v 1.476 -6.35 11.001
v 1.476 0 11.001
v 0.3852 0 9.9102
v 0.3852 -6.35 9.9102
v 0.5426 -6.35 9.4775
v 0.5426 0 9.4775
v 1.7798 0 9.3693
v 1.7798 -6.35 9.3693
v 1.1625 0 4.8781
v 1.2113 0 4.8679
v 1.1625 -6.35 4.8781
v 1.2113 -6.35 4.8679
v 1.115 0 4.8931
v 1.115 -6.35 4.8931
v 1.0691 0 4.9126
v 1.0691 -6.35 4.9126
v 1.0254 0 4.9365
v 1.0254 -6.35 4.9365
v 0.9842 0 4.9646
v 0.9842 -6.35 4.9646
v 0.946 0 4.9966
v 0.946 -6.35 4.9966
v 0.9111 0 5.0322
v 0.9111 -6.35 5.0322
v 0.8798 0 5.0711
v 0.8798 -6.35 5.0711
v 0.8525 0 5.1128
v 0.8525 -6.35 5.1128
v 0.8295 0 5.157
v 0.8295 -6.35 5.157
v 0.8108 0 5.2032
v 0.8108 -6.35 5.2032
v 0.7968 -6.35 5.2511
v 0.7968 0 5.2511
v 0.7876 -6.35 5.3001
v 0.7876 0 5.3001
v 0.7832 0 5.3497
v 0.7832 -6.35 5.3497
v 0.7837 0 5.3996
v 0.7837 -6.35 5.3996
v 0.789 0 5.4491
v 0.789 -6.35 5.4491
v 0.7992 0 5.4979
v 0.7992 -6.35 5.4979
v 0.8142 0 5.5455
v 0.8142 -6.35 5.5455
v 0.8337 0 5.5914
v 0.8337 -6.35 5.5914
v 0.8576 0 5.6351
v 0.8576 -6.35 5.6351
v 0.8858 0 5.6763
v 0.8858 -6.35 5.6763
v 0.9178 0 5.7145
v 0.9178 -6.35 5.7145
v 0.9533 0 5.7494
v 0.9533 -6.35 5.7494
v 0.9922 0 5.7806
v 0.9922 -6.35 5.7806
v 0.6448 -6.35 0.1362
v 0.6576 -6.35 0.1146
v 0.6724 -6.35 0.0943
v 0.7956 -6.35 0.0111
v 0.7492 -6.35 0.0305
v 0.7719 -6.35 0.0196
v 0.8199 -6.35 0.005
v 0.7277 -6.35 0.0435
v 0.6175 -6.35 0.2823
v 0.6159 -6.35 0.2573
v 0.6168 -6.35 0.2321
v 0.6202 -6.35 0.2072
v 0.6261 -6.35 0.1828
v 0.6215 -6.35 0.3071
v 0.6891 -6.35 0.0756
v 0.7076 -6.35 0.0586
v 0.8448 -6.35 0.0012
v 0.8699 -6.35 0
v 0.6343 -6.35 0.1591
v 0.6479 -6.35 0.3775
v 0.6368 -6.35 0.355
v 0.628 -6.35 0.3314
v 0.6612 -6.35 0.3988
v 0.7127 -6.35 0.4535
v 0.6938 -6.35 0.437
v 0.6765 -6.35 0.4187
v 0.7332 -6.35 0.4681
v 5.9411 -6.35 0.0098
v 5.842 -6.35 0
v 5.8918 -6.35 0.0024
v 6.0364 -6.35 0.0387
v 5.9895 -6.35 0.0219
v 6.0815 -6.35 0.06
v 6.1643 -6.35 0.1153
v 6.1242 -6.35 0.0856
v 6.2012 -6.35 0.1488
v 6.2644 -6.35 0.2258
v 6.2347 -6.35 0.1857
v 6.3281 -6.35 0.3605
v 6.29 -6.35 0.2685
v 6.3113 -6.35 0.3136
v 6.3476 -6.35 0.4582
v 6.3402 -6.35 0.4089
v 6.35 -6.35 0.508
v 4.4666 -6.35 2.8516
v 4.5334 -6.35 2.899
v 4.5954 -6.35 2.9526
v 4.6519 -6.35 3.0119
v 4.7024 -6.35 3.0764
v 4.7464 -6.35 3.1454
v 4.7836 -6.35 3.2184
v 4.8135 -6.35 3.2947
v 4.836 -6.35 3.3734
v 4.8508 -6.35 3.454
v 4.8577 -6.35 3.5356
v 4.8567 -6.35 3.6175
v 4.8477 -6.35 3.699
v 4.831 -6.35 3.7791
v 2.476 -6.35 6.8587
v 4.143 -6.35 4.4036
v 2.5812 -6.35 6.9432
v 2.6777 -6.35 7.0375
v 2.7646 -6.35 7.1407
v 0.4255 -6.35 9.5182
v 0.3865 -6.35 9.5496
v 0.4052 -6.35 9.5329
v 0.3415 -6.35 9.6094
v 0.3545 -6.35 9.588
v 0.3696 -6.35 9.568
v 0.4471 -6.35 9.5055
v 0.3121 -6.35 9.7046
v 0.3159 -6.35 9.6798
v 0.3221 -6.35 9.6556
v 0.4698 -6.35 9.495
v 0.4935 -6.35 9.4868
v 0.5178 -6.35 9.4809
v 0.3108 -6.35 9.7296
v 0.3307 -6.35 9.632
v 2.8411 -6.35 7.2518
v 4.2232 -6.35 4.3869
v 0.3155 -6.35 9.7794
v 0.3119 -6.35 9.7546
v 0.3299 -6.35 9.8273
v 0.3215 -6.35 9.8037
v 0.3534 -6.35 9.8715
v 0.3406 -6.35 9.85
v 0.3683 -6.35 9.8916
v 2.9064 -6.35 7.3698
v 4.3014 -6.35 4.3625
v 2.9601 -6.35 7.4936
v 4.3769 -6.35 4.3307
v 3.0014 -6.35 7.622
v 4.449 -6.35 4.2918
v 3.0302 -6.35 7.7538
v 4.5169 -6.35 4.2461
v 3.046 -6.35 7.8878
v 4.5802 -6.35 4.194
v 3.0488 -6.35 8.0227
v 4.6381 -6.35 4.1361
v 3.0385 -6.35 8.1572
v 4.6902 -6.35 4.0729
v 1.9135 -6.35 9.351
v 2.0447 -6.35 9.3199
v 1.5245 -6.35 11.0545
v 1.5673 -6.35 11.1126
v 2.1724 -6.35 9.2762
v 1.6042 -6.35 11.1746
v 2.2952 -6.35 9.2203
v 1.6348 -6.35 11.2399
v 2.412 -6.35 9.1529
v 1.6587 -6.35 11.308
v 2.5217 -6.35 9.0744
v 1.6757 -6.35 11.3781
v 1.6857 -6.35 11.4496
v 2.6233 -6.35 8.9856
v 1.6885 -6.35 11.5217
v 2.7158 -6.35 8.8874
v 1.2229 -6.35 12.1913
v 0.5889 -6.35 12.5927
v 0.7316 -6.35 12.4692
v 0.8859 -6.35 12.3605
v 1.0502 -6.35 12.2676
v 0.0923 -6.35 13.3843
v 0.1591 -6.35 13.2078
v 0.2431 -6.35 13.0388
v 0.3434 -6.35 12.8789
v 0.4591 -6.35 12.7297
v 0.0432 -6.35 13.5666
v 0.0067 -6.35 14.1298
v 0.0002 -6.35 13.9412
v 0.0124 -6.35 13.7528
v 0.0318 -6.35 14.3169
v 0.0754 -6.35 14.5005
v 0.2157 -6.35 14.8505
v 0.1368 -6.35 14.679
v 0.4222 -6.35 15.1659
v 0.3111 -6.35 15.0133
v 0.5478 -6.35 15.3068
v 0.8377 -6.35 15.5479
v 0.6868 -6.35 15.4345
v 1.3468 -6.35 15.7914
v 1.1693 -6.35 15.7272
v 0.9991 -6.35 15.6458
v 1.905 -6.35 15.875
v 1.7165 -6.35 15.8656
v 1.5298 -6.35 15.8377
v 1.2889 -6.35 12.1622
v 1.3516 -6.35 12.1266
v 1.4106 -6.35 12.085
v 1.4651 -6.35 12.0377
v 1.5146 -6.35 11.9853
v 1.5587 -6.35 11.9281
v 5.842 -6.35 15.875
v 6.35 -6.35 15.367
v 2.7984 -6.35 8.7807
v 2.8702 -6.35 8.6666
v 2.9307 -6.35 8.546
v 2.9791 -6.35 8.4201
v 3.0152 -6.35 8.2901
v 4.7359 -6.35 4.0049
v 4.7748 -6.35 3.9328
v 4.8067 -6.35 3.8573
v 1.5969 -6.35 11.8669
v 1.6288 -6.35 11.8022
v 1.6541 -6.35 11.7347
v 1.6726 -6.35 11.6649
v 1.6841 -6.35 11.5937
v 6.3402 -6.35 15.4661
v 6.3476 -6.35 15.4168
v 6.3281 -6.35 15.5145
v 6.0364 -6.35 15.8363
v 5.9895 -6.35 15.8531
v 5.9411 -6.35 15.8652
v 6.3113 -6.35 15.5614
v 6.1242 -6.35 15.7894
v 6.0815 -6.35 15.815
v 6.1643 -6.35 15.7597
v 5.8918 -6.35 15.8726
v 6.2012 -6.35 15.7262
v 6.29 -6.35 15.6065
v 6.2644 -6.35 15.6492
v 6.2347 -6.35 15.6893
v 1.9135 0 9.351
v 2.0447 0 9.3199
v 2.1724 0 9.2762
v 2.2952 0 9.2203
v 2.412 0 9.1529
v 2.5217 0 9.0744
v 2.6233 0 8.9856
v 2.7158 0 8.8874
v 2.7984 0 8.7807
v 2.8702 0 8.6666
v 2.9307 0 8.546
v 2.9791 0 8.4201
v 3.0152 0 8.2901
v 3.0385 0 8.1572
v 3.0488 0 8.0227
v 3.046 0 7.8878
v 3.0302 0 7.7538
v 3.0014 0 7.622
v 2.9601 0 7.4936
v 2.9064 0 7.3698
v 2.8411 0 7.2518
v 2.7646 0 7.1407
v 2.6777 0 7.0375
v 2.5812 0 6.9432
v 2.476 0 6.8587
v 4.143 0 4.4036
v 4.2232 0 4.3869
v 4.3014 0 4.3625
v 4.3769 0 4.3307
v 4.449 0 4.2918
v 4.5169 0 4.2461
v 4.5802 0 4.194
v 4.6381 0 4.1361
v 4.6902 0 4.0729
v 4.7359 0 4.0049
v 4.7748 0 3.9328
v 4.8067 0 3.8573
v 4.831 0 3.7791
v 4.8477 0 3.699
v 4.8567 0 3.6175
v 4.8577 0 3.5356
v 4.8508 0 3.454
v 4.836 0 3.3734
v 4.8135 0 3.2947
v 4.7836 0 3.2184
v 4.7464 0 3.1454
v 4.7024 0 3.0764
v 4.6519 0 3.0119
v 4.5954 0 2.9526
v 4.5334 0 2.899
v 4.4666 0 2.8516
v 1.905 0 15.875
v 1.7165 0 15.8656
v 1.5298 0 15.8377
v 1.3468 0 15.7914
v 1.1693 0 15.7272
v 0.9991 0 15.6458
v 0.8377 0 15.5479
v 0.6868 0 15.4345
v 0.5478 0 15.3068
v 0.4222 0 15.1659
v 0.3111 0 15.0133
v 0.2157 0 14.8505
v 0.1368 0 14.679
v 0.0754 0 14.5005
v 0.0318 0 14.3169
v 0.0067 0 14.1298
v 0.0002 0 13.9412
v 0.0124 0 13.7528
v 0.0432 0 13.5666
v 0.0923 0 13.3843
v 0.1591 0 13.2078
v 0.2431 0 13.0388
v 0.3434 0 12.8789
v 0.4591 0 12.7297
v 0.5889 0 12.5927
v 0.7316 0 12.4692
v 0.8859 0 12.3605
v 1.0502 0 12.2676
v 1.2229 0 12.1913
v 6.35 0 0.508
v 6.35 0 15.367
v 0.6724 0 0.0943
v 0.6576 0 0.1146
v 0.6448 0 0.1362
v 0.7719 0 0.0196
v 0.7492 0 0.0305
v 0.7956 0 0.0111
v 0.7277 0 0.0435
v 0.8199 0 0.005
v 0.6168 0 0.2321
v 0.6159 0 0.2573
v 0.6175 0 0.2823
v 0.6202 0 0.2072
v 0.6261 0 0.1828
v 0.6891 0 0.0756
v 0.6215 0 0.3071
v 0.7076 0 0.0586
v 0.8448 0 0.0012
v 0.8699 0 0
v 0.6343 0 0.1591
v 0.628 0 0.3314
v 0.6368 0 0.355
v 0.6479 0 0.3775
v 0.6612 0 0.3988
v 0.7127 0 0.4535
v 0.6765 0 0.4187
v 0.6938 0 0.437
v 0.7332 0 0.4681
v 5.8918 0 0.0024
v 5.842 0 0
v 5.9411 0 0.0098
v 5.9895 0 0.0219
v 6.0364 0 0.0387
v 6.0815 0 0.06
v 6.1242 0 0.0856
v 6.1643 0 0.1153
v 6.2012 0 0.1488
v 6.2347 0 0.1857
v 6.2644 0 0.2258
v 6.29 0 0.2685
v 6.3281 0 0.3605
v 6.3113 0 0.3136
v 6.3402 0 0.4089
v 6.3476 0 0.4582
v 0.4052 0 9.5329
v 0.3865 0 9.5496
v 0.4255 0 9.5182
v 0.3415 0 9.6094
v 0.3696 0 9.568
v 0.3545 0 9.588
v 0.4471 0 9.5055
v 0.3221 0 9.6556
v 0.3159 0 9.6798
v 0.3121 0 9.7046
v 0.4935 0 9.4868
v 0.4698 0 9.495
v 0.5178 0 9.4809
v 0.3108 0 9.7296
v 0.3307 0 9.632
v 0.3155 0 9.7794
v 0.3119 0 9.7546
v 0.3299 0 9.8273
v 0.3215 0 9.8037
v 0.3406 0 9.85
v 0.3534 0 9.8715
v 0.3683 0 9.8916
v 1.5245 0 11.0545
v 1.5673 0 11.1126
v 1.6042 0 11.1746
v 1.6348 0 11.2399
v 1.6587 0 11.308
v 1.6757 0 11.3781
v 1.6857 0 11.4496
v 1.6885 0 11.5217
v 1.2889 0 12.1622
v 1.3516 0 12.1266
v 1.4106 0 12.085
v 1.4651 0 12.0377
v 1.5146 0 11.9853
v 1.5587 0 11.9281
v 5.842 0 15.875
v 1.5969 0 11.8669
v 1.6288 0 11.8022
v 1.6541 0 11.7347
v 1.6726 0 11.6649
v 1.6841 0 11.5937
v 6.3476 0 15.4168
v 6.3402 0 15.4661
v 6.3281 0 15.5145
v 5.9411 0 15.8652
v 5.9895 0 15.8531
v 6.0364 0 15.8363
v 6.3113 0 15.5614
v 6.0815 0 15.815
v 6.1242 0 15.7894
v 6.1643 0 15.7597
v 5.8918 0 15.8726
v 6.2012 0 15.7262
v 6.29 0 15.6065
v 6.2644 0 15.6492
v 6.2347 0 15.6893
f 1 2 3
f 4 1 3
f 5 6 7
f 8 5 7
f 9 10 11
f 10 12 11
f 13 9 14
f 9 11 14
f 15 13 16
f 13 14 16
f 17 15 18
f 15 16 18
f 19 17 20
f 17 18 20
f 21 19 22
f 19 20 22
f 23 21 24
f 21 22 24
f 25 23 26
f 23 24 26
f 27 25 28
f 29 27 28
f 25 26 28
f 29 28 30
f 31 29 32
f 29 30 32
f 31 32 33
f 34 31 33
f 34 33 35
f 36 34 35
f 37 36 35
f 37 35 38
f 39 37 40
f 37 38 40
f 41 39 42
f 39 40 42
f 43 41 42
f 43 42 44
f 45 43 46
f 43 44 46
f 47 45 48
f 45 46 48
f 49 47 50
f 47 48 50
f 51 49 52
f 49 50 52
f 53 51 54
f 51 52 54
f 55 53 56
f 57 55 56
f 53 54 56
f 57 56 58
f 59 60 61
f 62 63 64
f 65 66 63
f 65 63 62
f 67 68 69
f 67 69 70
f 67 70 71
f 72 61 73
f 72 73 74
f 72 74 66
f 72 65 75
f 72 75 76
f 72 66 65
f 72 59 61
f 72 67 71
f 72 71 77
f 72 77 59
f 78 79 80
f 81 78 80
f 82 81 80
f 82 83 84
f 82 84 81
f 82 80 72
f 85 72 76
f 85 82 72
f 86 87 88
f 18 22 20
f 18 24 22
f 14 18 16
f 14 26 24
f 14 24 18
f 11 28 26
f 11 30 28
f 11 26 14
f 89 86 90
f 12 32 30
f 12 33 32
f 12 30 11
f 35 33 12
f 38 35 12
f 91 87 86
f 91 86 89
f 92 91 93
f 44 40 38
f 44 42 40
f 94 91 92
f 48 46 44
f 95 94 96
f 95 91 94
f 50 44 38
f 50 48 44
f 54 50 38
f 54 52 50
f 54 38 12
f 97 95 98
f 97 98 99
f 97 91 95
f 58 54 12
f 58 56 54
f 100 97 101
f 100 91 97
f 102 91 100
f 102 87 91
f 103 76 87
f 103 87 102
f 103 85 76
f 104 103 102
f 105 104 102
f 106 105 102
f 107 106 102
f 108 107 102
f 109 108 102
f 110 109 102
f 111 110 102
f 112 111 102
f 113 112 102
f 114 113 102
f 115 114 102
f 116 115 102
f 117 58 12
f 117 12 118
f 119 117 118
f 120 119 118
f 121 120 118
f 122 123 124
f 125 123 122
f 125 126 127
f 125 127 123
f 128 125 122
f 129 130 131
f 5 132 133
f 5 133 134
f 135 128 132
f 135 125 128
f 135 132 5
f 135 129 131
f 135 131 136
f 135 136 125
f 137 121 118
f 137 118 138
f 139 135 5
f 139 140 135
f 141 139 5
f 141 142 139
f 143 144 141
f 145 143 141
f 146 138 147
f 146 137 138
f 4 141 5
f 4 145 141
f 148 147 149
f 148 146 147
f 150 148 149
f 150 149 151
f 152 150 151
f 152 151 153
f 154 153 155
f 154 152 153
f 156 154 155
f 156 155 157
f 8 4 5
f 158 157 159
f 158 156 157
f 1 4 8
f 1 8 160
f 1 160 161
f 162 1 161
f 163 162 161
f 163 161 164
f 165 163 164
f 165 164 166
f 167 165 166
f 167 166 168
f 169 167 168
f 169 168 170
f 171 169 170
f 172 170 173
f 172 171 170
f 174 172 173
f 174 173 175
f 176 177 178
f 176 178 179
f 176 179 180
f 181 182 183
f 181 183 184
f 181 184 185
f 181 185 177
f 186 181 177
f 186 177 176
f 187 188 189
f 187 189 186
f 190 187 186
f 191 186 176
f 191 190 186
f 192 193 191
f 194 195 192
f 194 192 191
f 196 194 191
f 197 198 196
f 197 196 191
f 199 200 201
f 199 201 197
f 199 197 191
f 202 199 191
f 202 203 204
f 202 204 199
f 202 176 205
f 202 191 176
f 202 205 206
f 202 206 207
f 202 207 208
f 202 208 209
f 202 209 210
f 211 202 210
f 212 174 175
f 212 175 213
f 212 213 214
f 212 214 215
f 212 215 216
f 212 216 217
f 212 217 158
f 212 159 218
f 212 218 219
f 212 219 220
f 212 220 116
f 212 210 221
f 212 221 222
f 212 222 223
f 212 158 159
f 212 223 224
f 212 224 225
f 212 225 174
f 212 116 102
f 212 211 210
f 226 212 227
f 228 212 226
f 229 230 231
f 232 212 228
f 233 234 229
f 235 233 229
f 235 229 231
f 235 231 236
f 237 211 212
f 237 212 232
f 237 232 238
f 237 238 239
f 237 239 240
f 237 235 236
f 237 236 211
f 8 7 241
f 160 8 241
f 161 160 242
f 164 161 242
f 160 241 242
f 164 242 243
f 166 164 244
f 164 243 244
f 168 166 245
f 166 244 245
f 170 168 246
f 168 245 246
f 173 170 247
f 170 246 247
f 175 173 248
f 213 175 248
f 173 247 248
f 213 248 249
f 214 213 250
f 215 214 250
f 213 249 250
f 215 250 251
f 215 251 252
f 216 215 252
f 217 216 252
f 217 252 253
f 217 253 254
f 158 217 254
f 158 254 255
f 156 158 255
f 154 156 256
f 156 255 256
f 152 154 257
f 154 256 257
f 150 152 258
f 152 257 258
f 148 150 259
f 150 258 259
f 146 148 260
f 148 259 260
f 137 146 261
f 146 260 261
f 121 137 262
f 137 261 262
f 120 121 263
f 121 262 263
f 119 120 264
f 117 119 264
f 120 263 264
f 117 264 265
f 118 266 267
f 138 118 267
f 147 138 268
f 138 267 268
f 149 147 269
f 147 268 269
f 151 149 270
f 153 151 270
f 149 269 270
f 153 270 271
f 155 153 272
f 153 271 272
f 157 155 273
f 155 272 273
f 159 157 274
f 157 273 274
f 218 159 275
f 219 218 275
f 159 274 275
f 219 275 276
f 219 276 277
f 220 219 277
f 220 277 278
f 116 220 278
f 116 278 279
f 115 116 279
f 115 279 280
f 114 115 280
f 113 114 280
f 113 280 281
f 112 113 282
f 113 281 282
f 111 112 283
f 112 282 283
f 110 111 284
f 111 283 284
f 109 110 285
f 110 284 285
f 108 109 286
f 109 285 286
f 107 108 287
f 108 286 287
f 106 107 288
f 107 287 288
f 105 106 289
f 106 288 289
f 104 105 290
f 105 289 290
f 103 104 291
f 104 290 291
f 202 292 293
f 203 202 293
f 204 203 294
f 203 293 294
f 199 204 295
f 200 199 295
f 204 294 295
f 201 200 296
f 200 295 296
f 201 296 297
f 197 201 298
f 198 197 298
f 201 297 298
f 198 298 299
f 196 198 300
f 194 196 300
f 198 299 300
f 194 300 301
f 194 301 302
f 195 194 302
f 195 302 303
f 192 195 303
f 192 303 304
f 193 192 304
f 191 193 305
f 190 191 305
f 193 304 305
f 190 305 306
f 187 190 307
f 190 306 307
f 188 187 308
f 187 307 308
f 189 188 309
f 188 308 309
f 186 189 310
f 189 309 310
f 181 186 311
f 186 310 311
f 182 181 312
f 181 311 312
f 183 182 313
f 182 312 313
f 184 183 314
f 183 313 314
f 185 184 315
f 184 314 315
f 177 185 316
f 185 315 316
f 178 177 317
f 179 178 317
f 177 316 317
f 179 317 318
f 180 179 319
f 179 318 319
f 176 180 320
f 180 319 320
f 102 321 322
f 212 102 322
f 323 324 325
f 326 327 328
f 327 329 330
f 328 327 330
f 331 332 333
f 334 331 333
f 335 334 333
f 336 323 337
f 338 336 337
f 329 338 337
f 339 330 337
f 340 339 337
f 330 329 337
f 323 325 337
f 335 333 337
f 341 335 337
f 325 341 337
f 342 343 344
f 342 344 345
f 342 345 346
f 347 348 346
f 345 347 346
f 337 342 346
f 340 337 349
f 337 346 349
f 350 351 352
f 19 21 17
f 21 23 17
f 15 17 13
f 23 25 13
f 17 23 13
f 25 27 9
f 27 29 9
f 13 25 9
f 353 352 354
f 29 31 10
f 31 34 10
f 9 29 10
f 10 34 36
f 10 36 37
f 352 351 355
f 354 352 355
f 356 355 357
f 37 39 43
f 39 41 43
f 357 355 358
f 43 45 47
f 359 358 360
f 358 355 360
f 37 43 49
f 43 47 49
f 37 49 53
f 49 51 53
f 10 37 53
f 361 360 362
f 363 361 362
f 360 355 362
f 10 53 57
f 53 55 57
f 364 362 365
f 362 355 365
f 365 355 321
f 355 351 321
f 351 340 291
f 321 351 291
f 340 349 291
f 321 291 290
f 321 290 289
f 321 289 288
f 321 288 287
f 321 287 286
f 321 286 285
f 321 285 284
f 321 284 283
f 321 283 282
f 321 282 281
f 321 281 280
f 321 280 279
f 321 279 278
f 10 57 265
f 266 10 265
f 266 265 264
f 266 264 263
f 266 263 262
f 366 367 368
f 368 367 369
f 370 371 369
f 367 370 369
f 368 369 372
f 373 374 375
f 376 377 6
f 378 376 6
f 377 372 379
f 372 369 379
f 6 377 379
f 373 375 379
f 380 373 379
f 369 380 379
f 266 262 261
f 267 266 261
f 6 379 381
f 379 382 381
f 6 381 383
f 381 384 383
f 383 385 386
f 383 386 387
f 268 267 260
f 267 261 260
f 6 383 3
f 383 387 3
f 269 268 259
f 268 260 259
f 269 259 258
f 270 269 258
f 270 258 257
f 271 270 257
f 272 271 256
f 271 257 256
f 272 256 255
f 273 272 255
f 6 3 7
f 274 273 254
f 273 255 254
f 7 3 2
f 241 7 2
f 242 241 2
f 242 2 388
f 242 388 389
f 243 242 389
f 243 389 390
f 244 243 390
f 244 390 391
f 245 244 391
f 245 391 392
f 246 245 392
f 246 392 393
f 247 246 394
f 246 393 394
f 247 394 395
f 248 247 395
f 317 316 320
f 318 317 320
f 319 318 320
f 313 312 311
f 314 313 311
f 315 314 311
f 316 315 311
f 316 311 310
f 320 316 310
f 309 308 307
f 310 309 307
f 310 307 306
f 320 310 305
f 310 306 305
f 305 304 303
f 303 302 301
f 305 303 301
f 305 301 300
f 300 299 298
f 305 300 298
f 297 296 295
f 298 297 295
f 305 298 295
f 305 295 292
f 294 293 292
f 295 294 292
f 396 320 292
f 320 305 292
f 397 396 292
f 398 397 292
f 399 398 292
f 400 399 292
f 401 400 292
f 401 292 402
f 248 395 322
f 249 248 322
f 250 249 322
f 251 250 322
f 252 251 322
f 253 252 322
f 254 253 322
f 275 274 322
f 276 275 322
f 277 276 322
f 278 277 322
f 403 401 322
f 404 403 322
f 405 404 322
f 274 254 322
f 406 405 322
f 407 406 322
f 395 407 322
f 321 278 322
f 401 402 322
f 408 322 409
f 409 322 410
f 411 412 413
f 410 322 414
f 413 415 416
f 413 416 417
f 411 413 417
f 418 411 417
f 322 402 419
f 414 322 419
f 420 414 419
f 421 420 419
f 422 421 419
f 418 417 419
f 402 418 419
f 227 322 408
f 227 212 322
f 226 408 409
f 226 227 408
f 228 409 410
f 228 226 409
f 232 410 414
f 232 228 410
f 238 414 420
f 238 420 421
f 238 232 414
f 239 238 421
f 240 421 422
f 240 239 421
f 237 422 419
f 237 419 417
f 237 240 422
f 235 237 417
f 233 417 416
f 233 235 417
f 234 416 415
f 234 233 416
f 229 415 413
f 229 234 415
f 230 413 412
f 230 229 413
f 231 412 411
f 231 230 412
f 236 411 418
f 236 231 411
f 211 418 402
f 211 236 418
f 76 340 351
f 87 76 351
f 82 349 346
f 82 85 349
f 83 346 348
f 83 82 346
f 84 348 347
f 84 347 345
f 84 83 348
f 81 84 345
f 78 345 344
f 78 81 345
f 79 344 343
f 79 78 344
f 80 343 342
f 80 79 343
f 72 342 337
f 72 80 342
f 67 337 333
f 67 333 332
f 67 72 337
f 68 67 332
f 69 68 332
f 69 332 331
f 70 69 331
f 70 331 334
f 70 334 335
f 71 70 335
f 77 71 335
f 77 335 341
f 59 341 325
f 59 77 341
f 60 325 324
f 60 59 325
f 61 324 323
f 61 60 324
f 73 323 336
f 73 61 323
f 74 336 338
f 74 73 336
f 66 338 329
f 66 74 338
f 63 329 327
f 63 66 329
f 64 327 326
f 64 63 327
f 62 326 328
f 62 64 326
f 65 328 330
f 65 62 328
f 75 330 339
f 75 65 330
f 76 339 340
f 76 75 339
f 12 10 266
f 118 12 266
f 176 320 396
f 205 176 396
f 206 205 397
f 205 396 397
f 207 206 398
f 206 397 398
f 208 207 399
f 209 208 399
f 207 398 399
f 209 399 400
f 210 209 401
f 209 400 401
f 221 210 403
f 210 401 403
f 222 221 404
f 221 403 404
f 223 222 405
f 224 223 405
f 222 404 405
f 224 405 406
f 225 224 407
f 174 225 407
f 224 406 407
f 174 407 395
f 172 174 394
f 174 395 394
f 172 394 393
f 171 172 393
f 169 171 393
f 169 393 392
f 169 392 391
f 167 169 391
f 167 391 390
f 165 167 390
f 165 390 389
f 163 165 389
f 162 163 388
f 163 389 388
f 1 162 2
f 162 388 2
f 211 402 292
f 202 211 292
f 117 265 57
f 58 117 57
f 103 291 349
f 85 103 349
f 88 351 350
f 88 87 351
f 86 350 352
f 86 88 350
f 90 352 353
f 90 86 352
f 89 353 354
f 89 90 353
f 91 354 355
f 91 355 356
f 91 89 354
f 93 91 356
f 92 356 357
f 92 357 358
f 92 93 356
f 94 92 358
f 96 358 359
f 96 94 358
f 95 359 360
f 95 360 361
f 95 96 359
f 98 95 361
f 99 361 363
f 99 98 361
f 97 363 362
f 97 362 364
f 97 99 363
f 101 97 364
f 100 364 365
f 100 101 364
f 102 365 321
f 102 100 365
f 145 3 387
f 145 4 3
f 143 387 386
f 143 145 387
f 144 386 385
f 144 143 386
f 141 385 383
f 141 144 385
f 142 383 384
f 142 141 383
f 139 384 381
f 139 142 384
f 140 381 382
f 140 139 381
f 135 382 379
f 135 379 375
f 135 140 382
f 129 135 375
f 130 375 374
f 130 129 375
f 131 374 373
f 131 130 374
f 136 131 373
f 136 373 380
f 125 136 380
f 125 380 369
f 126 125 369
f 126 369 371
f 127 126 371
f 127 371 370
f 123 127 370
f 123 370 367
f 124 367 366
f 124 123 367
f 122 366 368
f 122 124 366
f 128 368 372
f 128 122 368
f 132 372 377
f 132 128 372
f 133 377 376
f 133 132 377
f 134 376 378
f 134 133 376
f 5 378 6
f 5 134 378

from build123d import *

# Parameters (mm, degrees)
F1_DEPTH = 6.35
F2_R     = 0.254
F3_R     = 0.508


with BuildPart() as f1:
    # F0 (on Front) → F1 (new body)
    with BuildSketch(Plane.XZ):
        with BuildLine():
            Line((4.466619, 2.85162), (0, 0))
            Line((0, 0), (6.35, 0))
            Line((6.35, 0), (6.35, 15.875))
            Line((6.35, 15.875), (1.905, 15.875))
            ThreePointArc((1.905, 15.875), (0.031846, 14.316871), (1.222856, 12.191319))
            ThreePointArc((1.222856, 12.191319), (1.672644, 11.664932), (1.476048, 11.001048))
            Line((1.476048, 11.001048), (0, 9.525))
            Line((0, 9.525), (1.779807, 9.369287))
            ThreePointArc((1.779807, 9.369287), (2.998749, 8.355504), (2.476049, 6.858721))
            Line((2.476049, 6.858721), (0, 5.059766))
            Line((0, 5.059766), (4.14303, 4.403575))
            ThreePointArc((4.14303, 4.403575), (4.840359, 3.739258), (4.466619, 2.85162))
        make_face()
    extrude(amount=F1_DEPTH)

    # F2
    f2_edges = [f1.edges().sort_by_distance(p)[0] for p in [
        (0, -3.175, 0),
        (0, -3.175, 9.525),
    ]]
    fillet(f2_edges, radius=F2_R)

    # F3
    f3_edges = [f1.edges().sort_by_distance(p)[0] for p in [
        (6.35, -3.175, 0),
        (6.35, -3.175, 15.875),
        (0, -3.175, 5.059766),
    ]]
    fillet(f3_edges, radius=F3_R)


solid = f1.part
